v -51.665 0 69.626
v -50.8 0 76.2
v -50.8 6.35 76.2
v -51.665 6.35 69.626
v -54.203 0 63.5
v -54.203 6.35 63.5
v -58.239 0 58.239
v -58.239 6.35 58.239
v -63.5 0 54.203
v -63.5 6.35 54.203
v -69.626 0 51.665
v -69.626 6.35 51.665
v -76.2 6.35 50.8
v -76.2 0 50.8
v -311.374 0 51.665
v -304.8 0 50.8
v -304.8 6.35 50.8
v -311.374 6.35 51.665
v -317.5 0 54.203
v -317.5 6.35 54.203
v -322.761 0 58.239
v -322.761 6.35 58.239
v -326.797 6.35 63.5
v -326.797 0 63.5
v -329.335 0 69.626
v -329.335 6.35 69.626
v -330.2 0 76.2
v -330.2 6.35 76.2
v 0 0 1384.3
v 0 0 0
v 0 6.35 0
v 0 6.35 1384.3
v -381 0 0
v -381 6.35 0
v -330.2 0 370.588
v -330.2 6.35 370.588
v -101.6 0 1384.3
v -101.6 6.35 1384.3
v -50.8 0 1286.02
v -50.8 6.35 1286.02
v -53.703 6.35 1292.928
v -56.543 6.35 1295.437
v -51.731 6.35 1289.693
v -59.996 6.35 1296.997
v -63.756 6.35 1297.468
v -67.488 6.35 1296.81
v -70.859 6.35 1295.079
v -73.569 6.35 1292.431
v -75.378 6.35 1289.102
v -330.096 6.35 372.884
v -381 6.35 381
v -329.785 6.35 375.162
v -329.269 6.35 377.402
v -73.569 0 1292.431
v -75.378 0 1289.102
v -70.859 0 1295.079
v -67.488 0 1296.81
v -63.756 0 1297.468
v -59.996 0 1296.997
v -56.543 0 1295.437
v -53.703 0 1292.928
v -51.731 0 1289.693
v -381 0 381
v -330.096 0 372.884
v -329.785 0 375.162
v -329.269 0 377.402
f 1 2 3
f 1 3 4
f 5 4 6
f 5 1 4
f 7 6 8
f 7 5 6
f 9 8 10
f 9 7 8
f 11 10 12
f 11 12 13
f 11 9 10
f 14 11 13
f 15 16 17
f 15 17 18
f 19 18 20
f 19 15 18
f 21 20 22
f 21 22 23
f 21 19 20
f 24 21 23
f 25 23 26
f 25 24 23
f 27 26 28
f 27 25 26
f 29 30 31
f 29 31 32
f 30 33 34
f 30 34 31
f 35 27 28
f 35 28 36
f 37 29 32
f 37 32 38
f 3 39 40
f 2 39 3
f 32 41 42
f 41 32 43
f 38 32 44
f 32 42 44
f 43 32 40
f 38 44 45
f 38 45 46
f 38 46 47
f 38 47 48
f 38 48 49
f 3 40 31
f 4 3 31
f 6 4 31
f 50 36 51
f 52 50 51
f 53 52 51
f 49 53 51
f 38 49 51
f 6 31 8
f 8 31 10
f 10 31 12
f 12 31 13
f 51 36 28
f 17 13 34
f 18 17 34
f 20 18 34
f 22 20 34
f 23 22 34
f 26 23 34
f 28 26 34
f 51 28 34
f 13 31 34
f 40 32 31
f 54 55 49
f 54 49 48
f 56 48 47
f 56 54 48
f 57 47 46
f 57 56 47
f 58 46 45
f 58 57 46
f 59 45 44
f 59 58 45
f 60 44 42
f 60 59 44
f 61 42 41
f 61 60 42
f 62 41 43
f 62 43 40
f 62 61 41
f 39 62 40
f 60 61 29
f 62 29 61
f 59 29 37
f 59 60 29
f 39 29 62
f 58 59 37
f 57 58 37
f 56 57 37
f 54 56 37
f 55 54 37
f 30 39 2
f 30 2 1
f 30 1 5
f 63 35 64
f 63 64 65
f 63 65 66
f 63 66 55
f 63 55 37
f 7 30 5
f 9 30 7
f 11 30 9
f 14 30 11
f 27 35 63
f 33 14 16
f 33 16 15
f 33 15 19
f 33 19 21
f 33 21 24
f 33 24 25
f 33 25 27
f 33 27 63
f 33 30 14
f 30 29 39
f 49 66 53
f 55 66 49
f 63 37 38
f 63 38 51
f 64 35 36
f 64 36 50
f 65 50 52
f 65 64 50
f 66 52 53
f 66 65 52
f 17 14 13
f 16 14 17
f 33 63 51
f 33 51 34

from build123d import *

# Parameters (mm, degrees)
BOSS_EXTRUDE1_DEPTH = 6.35


with BuildPart() as part:
    # Sketch1 → Boss-Extrude1 (new body)
    with BuildSketch(Plane(origin=(0, 0, 0), x_dir=(1, 0, 0), z_dir=(0, 1, 0))):
        Polygon((0, 0), (0, -1384.3), (-101.6, -1384.3), (-381, -381), (-381, 0), align=None)
        with BuildLine():
            Line((-329.268912254, -377.402099424), (-75.377865092, -1289.10176878))
            ThreePointArc((-75.377865092, -1289.10176878), (-61.858495332, -1297.3737261), (-50.8, -1286.019946218))
            Line((-50.8, -1286.019946218), (-50.8, -76.2))
            ThreePointArc((-50.8, -76.2), (-58.239487758, -58.239487758), (-76.2, -50.8))
            Line((-76.2, -50.8), (-304.8, -50.8))
            ThreePointArc((-304.8, -50.8), (-322.760512242, -58.239487758), (-330.2, -76.2))
            Line((-330.2, -76.2), (-330.2, -370.58797196))
            ThreePointArc((-330.2, -370.58797196), (-329.966151586, -374.026694742), (-329.268912254, -377.402099424))
        make_face(mode=Mode.SUBTRACT)
    extrude(amount=BOSS_EXTRUDE1_DEPTH)


solid = part.part
